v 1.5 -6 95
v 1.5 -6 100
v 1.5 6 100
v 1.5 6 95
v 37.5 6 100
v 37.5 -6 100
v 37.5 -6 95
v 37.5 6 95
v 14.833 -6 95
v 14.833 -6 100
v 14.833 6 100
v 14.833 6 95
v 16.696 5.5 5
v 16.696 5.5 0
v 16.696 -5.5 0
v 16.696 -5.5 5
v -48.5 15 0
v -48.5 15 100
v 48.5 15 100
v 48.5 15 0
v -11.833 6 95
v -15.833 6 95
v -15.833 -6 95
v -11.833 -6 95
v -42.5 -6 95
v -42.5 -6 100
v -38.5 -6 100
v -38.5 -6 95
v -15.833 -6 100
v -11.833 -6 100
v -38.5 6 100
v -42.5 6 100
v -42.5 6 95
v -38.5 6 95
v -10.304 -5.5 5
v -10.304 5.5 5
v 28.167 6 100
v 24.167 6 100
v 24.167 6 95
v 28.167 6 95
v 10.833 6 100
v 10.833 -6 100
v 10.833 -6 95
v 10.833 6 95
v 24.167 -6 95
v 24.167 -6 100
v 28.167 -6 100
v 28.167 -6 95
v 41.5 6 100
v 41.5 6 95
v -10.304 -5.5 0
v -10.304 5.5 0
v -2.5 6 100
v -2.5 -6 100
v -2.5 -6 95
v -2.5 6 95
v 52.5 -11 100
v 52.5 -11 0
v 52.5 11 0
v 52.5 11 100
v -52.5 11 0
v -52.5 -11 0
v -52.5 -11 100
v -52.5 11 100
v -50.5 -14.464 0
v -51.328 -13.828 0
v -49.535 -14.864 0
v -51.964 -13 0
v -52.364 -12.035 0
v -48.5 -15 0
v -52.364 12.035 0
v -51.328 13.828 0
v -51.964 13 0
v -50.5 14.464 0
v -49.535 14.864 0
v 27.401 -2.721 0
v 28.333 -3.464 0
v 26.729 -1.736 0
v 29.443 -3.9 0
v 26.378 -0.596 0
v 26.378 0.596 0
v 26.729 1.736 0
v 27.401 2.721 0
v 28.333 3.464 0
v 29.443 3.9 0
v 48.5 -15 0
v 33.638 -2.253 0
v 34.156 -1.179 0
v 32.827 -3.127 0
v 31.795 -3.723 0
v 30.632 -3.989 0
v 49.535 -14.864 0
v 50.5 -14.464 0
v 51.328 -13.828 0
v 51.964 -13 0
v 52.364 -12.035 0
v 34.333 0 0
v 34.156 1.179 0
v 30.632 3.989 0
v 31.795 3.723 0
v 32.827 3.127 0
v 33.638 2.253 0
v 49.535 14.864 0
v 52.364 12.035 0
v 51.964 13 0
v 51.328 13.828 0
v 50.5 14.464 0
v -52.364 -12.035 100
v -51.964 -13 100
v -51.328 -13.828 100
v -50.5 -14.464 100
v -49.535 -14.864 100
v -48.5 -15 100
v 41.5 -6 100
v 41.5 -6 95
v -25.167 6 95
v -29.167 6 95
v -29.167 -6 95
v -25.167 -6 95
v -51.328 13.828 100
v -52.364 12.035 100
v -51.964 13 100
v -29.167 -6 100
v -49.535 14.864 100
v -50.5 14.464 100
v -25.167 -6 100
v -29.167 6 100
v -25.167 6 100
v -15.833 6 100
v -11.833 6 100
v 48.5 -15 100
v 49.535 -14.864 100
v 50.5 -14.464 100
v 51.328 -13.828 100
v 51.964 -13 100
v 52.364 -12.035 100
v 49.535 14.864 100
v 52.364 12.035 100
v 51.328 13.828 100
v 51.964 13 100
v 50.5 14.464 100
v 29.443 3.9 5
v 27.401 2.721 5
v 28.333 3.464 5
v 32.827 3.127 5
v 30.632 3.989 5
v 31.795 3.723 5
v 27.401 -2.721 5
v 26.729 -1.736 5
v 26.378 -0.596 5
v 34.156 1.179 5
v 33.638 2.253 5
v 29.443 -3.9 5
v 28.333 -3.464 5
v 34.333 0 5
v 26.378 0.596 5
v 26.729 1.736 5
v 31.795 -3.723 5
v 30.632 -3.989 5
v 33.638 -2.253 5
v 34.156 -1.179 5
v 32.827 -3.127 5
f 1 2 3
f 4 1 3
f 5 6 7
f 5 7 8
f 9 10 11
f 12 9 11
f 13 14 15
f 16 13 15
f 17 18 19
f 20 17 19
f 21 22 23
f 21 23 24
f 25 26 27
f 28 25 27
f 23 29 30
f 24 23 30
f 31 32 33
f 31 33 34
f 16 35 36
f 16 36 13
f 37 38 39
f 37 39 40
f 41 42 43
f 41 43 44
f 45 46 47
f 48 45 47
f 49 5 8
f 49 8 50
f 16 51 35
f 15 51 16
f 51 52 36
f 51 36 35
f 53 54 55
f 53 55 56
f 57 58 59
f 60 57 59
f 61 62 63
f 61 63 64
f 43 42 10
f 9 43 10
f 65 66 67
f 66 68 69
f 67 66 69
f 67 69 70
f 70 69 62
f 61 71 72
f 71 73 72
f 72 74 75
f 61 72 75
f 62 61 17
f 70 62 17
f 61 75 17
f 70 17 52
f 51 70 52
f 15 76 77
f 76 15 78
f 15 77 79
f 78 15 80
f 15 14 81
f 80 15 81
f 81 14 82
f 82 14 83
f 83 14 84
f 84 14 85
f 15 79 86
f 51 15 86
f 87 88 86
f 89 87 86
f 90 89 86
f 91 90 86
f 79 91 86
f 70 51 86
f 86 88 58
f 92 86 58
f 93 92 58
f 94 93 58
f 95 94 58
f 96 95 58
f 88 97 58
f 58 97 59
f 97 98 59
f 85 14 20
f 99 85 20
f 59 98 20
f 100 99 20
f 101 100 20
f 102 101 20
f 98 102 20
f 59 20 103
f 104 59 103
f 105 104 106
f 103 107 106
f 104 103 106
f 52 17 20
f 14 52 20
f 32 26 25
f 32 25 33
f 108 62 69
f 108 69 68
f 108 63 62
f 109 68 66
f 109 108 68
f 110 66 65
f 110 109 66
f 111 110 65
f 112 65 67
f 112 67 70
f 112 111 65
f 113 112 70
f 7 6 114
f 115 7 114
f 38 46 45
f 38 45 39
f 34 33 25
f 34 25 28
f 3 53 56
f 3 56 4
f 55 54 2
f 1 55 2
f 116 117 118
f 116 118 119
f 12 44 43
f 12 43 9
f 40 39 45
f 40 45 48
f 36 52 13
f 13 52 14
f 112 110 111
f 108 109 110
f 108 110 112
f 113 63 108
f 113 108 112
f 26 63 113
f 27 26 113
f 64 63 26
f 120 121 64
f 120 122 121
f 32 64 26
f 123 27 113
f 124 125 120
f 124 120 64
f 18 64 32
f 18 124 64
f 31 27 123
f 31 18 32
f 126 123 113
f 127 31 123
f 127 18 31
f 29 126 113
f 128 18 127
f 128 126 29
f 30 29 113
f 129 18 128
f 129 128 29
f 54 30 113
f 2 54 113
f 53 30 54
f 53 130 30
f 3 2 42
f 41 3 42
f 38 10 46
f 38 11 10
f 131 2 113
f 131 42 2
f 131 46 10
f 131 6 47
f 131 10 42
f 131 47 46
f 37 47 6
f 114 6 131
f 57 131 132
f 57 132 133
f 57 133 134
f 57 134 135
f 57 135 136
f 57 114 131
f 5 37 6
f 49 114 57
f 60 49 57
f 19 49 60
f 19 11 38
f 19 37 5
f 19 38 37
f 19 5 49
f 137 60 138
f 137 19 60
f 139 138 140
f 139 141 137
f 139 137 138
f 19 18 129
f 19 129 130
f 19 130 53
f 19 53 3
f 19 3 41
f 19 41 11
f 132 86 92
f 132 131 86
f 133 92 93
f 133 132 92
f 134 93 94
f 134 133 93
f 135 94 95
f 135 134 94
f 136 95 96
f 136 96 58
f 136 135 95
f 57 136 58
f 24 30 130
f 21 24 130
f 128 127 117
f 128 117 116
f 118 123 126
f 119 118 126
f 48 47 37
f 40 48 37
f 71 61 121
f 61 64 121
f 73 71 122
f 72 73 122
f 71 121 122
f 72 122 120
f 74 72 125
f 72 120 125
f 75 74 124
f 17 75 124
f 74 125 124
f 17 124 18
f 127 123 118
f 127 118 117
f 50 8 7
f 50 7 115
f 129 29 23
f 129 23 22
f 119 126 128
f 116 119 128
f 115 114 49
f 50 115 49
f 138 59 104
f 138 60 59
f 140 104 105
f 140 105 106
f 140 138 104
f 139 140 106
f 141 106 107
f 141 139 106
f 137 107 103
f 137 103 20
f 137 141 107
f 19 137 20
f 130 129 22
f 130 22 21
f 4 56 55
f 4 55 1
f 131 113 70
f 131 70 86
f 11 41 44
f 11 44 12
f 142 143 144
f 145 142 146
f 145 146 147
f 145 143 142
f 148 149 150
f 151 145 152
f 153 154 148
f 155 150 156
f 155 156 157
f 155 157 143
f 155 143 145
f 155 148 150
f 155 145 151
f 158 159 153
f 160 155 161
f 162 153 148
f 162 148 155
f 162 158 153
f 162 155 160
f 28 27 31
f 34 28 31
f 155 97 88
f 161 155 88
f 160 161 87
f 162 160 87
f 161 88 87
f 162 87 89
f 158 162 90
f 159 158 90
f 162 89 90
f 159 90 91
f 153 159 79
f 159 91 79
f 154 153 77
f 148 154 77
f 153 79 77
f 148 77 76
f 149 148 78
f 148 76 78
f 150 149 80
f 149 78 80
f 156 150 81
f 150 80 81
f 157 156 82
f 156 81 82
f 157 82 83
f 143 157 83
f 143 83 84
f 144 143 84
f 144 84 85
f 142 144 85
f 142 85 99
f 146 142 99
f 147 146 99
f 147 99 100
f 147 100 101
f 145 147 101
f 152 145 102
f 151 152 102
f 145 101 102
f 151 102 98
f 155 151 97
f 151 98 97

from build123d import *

# Parameters (mm, degrees)
SKETCH_W            = 105
SKETCH_H            = 30
PAD_DEPTH           = 100
FILLET_R            = 4
SKETCH001_W         = 4
SKETCH001_H         = 12
POCKET_DEPTH        = 5
LINEARPATTERN_COUNT = 7
LINEARPATTERN_PITCH = 13.333333
SKETCH002_R         = 4
SKETCH002_W         = 27
SKETCH002_H         = 11
POCKET001_DEPTH     = 5


with BuildPart() as part:
    # Sketch → Pad (new body)
    with BuildSketch(Plane.XY):
        Rectangle(SKETCH_W, SKETCH_H)
    extrude(amount=PAD_DEPTH)

    # Fillet
    fillet_edges = [part.edges().sort_by_distance(p)[0] for p in [
        (52.5, 15, 50),
        (52.5, -15, 50),
        (-52.5, 15, 50),
        (-52.5, -15, 50),
    ]]
    fillet(fillet_edges, radius=FILLET_R)

    # Sketch001 (on Face5 of Fillet) → Pocket (cut)
    with BuildSketch(Plane.XY.offset(100)):
        with Locations((-40.5, 0)):
            Rectangle(SKETCH001_W, SKETCH001_H)
    pocket = extrude(amount=-POCKET_DEPTH, mode=Mode.SUBTRACT)

    # LinearPattern: Pocket ×7
    with Locations(*[(i * LINEARPATTERN_PITCH, 0, 0) for i in range(1, LINEARPATTERN_COUNT)]):
        add(pocket, mode=Mode.SUBTRACT)

    # Sketch002 (on Face2 of LinearPattern) → Pocket001 (cut)
    with BuildSketch(Plane(origin=(0, 0, 0), x_dir=(1, 0, 0), z_dir=(0, 0, -1))):
        with Locations((30.333276, 0)):
            Circle(SKETCH002_R)
        with Locations((3.195694, 0)):
            Rectangle(SKETCH002_W, SKETCH002_H)
    extrude(amount=-POCKET001_DEPTH, mode=Mode.SUBTRACT)


solid = part.part
